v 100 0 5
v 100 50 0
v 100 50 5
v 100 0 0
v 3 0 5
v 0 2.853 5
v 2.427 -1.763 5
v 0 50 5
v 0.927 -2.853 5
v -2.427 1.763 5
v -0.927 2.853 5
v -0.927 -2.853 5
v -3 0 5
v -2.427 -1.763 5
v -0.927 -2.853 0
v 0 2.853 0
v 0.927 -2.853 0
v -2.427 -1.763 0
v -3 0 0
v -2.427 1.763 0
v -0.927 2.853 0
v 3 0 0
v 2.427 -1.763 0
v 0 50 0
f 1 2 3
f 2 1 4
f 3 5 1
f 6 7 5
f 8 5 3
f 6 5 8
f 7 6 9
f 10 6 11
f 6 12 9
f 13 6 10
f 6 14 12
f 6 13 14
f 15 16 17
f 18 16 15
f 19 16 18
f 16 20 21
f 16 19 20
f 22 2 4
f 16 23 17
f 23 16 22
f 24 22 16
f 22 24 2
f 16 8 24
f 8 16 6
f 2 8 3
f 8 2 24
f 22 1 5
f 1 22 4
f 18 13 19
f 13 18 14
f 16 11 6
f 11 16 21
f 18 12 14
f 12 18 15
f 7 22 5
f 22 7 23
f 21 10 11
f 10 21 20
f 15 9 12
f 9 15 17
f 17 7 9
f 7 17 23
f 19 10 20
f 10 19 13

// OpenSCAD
// dimensions in millimeter [width, depth, height]
plate = [100, 50, 5];

hole_dm = 6;
hole_margin = 4;

cube(plate);

cylinder( h = plate.z, d = hole_dm);

echo(plate.x, plate.y, plate.z);
echo(plate[0], plate[1], plate[2]);
